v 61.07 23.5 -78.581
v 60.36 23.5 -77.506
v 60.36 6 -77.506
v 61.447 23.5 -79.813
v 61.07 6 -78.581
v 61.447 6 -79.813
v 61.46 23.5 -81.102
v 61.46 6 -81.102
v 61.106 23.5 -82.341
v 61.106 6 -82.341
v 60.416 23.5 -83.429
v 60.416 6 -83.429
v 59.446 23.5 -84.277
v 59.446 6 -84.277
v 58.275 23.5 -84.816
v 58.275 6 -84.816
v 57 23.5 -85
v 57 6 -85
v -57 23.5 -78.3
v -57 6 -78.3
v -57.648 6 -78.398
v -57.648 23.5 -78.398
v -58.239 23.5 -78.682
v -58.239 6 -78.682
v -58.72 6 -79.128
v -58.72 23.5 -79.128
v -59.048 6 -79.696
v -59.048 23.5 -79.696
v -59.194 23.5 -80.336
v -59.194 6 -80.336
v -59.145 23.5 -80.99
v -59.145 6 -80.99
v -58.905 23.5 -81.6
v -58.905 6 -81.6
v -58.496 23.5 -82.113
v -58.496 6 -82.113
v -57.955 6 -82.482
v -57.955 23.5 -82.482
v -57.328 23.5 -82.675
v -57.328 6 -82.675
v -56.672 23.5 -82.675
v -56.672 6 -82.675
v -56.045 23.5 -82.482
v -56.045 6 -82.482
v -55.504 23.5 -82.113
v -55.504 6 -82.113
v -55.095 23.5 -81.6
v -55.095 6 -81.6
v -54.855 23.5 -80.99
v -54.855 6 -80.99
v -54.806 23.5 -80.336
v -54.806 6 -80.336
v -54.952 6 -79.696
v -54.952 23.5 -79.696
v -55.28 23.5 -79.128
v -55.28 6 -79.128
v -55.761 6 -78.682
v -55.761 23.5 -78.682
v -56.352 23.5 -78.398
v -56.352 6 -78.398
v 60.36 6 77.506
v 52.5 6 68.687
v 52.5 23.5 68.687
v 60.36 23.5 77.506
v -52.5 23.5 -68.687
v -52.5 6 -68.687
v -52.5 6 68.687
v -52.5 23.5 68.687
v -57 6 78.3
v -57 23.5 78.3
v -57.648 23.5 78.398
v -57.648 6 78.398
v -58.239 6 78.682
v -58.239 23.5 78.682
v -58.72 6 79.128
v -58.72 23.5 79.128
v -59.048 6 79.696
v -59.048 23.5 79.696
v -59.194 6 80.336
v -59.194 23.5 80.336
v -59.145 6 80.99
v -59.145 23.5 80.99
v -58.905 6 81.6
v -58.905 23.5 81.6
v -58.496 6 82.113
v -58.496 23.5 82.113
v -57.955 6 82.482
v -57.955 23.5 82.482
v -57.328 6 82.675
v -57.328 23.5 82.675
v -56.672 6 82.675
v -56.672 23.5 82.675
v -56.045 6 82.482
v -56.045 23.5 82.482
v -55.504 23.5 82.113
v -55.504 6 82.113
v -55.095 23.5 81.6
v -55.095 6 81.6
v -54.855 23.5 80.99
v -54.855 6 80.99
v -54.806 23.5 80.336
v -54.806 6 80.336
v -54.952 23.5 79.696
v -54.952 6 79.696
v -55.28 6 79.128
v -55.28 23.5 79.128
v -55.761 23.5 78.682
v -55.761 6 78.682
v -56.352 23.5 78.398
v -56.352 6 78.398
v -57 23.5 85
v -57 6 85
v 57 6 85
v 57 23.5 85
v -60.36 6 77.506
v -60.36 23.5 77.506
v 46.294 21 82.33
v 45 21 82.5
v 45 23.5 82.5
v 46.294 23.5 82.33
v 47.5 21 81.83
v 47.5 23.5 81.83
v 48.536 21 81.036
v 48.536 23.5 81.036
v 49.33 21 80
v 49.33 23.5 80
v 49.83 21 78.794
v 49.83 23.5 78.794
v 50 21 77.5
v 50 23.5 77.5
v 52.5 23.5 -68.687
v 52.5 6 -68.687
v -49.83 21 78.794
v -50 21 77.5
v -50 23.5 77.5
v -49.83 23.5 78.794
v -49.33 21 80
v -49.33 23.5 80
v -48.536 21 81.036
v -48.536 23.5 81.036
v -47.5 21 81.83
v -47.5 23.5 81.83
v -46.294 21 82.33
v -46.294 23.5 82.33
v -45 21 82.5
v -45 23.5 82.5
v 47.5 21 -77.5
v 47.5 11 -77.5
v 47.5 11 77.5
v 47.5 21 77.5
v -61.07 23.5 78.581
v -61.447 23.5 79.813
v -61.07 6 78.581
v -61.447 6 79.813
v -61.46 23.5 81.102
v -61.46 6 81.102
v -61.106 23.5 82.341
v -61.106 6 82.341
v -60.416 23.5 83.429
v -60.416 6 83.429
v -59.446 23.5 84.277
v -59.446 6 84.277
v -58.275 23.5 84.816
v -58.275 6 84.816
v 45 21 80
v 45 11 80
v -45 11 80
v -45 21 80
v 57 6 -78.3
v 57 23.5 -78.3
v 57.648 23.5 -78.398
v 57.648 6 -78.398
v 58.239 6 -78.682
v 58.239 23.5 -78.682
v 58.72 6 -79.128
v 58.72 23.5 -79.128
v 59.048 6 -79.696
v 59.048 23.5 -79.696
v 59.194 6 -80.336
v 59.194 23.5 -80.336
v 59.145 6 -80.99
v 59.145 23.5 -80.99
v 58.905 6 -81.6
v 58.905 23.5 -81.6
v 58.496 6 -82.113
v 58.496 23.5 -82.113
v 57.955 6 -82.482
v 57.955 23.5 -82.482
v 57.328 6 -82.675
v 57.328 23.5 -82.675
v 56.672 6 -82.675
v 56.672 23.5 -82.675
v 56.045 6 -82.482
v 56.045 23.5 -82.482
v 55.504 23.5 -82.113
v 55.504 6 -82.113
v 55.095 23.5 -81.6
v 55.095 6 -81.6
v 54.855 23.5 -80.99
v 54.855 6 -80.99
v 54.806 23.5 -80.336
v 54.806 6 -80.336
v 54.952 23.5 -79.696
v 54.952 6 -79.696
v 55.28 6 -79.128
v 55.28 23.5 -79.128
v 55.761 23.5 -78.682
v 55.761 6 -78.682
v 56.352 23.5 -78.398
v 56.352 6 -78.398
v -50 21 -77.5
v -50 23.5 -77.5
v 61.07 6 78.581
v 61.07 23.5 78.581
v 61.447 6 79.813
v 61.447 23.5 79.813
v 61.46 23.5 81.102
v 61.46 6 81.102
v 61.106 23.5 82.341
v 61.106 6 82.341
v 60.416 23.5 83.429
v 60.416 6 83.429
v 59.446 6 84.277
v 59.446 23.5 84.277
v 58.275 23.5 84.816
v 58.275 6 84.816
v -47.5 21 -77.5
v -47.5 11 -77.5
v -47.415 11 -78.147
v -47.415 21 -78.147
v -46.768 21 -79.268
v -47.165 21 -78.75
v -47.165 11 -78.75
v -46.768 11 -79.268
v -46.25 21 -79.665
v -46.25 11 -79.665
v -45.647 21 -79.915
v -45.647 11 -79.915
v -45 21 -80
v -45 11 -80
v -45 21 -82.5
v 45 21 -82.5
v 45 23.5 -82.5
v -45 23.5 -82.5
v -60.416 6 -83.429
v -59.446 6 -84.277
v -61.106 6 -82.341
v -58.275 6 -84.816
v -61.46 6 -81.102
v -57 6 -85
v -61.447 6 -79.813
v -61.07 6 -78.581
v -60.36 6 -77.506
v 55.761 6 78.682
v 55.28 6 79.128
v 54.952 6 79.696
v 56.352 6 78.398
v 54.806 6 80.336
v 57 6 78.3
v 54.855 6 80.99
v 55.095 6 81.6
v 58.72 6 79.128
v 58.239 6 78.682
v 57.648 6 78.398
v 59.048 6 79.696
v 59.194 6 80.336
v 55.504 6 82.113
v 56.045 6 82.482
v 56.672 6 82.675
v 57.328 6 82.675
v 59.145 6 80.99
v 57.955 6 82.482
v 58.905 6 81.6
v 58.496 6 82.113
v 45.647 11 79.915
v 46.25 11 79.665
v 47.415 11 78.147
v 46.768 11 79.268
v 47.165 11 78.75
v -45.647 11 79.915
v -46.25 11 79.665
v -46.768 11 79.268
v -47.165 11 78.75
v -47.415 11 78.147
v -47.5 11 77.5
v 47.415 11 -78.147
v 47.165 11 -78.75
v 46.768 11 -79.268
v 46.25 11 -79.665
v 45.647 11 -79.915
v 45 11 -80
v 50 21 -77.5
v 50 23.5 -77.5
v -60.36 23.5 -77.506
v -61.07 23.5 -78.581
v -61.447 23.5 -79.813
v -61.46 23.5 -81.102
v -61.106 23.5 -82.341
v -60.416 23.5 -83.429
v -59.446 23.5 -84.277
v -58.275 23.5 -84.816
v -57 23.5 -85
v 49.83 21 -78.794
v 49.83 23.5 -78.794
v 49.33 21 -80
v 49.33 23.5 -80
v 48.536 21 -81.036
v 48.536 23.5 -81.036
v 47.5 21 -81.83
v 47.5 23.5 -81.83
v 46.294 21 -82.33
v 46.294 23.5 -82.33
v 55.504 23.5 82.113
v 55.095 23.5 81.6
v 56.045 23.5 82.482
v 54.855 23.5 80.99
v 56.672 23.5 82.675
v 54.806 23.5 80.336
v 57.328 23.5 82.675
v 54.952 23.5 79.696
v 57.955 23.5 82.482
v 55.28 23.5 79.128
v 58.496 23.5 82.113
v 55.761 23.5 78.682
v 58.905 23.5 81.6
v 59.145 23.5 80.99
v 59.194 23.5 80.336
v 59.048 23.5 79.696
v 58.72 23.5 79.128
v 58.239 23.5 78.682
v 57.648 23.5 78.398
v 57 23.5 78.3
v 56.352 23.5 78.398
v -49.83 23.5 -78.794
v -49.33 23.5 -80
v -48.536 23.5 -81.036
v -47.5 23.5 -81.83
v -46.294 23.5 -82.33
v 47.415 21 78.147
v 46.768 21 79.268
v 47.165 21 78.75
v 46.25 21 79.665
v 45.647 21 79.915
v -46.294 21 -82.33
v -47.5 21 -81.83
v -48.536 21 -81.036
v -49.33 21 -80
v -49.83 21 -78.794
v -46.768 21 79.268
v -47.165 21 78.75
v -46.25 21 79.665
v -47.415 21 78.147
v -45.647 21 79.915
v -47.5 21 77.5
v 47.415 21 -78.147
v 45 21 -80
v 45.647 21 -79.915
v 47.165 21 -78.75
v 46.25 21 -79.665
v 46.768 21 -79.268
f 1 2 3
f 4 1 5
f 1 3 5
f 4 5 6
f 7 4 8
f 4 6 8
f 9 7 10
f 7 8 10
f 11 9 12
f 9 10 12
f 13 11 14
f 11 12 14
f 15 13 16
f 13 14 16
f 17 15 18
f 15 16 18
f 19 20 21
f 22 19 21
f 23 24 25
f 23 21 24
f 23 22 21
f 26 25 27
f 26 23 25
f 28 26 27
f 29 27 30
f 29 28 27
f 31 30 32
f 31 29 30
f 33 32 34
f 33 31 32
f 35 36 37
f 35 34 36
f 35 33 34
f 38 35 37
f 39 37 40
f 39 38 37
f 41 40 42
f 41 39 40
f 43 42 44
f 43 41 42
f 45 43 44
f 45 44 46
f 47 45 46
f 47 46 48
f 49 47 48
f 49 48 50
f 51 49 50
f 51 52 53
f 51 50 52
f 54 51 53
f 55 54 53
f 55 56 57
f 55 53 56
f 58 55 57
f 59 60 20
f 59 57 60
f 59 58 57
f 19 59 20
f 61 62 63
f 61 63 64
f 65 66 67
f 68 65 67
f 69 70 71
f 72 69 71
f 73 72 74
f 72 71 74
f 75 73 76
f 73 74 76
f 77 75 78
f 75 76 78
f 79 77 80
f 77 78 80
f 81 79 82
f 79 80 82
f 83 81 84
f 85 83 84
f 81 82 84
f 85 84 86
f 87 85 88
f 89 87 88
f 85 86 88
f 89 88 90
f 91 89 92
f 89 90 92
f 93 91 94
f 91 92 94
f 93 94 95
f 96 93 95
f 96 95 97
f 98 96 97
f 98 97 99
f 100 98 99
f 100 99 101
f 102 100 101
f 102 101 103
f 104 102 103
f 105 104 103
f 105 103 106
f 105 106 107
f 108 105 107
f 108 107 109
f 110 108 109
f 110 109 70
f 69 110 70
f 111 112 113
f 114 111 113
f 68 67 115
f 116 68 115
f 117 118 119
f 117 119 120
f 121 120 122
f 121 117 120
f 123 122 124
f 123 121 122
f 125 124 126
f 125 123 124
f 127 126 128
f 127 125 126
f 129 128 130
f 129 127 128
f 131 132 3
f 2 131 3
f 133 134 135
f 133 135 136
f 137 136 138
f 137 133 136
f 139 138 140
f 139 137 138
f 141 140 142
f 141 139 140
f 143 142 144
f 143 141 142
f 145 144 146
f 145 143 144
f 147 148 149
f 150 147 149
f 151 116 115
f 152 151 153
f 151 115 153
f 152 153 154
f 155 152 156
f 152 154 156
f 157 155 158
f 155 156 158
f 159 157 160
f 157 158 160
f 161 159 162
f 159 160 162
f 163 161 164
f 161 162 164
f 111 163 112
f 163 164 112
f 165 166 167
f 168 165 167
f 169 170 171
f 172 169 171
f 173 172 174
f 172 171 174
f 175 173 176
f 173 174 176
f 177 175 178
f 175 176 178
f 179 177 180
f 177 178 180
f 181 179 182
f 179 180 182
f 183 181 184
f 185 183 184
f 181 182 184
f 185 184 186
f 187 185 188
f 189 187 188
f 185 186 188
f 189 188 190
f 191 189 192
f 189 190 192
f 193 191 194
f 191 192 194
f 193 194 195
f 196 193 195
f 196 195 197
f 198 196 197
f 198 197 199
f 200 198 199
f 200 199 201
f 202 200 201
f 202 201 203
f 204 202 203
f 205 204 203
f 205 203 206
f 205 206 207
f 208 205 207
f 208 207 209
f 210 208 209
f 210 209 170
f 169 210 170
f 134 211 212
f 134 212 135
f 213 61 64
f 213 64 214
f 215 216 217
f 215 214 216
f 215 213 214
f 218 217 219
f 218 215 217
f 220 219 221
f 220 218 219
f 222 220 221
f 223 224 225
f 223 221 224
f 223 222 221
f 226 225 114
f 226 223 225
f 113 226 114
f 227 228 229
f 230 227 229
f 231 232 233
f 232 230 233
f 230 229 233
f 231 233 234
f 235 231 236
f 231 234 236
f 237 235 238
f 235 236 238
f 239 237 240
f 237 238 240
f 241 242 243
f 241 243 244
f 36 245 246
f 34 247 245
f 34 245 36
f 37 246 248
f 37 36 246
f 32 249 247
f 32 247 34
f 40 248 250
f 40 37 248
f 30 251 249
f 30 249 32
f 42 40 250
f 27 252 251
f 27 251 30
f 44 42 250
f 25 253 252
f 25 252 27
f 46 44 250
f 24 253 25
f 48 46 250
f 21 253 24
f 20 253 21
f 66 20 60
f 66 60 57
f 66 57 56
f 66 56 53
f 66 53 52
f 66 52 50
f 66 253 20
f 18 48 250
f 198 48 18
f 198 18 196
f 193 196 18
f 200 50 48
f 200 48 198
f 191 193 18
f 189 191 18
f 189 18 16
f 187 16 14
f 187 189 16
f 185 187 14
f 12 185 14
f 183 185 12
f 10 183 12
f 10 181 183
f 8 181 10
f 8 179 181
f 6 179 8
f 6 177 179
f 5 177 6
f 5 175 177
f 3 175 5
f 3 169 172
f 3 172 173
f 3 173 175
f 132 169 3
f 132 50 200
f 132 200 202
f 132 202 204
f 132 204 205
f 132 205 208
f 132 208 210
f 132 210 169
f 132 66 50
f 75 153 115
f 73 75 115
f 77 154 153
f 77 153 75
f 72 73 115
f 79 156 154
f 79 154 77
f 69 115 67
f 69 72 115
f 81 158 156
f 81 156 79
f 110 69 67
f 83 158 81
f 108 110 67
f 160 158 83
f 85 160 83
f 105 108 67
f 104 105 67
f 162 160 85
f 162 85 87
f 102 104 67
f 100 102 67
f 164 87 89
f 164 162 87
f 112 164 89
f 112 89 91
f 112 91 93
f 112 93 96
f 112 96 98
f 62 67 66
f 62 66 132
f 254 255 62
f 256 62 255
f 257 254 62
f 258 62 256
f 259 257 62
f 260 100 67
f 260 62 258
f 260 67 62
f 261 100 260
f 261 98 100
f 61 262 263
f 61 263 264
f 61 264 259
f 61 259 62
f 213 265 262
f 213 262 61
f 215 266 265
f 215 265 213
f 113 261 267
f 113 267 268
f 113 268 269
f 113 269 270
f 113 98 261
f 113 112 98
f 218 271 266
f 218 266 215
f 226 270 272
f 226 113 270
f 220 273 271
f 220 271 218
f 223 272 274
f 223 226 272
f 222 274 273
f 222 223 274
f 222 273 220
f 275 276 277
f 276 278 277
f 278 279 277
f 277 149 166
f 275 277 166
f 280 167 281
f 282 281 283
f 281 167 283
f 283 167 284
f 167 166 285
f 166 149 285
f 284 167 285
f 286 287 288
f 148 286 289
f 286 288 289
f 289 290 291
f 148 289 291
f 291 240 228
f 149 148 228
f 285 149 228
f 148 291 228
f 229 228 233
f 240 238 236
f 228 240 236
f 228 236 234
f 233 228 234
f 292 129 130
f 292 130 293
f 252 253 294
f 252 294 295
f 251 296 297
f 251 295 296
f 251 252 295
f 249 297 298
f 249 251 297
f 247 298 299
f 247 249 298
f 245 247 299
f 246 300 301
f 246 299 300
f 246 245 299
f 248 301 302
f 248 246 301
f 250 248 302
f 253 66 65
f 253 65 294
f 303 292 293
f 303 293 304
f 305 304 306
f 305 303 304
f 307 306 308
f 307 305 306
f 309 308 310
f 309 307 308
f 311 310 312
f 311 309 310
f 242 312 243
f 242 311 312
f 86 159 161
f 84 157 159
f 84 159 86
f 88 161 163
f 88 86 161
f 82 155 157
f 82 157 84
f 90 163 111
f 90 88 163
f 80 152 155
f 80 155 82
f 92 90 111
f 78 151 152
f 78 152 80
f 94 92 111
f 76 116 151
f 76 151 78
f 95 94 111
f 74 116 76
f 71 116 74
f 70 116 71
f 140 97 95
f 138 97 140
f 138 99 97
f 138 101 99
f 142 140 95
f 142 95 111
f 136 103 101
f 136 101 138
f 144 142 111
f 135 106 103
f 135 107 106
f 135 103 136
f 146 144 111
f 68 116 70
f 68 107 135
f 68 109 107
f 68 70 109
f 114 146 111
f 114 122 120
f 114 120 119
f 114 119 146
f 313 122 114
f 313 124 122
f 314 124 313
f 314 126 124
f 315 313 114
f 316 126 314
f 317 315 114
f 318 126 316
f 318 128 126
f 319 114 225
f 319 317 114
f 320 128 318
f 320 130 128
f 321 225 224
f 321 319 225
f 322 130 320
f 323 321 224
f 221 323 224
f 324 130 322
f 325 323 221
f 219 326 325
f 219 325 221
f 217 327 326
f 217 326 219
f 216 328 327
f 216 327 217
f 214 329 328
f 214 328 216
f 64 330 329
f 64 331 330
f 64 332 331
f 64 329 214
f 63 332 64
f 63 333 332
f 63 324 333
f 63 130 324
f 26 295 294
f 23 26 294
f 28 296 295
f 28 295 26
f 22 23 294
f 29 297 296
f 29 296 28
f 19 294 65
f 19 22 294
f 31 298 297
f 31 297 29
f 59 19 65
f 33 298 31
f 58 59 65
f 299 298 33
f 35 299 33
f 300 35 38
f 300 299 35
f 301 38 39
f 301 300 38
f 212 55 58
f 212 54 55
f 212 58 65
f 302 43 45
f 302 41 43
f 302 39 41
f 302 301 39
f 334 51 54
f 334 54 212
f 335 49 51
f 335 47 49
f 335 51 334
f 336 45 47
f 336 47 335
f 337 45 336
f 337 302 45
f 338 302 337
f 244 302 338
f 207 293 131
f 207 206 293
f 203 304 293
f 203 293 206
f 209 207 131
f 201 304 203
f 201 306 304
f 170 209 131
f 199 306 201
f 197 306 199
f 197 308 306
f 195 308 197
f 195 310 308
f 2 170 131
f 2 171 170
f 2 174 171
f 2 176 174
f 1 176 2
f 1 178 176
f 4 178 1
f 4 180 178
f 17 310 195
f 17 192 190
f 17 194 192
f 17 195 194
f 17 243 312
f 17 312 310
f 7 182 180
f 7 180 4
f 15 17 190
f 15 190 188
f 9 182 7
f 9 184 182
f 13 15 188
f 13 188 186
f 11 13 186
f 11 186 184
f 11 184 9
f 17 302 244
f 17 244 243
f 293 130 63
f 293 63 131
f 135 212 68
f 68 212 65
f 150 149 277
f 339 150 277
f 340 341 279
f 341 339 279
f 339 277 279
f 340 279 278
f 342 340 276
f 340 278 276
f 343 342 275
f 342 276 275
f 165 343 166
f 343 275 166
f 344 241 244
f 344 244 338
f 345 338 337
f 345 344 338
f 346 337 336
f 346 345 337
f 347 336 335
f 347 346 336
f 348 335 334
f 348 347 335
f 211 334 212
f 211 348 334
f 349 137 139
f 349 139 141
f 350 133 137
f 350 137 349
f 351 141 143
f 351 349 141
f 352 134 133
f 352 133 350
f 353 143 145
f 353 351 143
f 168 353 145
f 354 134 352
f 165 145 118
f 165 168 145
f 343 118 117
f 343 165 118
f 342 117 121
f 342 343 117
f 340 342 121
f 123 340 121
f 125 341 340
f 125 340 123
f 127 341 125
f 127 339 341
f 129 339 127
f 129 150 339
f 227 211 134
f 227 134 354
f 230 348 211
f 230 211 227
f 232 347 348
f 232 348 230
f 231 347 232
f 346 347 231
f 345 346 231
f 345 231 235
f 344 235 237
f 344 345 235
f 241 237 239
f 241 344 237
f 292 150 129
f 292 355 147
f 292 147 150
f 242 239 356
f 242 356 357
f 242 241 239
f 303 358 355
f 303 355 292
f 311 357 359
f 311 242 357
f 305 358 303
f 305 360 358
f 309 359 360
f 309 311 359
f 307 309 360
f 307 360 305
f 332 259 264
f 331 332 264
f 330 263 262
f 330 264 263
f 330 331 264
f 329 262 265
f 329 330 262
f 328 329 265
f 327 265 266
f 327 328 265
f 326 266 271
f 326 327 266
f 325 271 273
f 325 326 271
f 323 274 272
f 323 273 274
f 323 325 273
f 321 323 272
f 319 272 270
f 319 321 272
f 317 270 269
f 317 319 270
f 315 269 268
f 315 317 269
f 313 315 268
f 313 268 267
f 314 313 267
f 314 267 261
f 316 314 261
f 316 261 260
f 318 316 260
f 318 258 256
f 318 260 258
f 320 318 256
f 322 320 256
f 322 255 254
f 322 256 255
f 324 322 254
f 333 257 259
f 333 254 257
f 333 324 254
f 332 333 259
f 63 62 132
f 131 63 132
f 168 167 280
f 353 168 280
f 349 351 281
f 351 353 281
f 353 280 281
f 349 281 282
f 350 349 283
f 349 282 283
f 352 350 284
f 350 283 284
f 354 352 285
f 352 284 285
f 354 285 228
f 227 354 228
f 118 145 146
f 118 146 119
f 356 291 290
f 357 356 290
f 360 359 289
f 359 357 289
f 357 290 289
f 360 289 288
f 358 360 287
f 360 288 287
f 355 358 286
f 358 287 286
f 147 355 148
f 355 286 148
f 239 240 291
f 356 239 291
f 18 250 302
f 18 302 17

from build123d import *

# Parameters (mm, degrees)
SALIENTE_EXTRUIR2_DEPTH   = 11
SALIENTE_EXTRUIR3_DEPTH   = 25.5
SALIENTE_EXTRUIR4_DEPTH   = 2.5
SALIENTE_EXTRUIR5_DEPTH   = 36.5
SIMETR_A2_COPY_1_DEPTH    = 36.5
CROQUIS6_R                = 2.2
CORTAR_EXTRUIR2_DEPTH     = 112.083302076
SIMETR_A4_COPY_1_SKETCH_R = 2.2
SIMETR_A4_COPY_1_DEPTH    = 112.083302076
CORTAR_EXTRUIR3_DEPTH     = 6
CORTAR_EXTRUIR4_START     = -18
CORTAR_EXTRUIR4_DEPTH     = 18
CORTAR_EXTRUIR5_START     = -13
CORTAR_EXTRUIR5_DEPTH     = 13


with BuildPart() as part:
    # Croquis1 → Saliente-Extruir2 (new body)
    # profile 1 of 3: a face of its own
    with BuildSketch(Plane(origin=(0, 0, 0), x_dir=(1, 0, 0), z_dir=(0, 1, 0))):
        with BuildLine():
            Line((-45, 85), (45, 85))
            ThreePointArc((45, 85), (50.303300859, 82.803300859), (52.5, 77.5))
            Line((52.5, 77.5), (52.5, -77.5))
            ThreePointArc((52.5, -77.5), (50.303300859, -82.803300859), (45, -85))
            Line((45, -85), (-45, -85))
            ThreePointArc((-45, -85), (-50.303300859, -82.803300859), (-52.5, -77.5))
            Line((-52.5, -77.5), (-52.5, 77.5))
            ThreePointArc((-52.5, 77.5), (-50.303300859, 82.803300859), (-45, 85))
        make_face()
        with BuildLine():
            ThreePointArc((-45, 82.5), (-48.535533906, 81.035533906), (-50, 77.5))
            Line((-50, 77.5), (-50, -77.5))
            ThreePointArc((-50, -77.5), (-48.535533906, -81.035533906), (-45, -82.5))
            Line((-45, -82.5), (45, -82.5))
            ThreePointArc((45, -82.5), (48.535533906, -81.035533906), (50, -77.5))
            Line((50, -77.5), (50, 77.5))
            ThreePointArc((50, 77.5), (48.535533906, 81.035533906), (45, 82.5))
            Line((45, 82.5), (-45, 82.5))
        make_face(mode=Mode.SUBTRACT)
    # profile 2 of 3: a face of its own
    with BuildSketch(Plane(origin=(0, 0, 0), x_dir=(1, 0, 0), z_dir=(0, 1, 0))):
        with BuildLine():
            Line((-45, 82.5), (45, 82.5))
            ThreePointArc((45, 82.5), (48.535533906, 81.035533906), (50, 77.5))
            Line((50, 77.5), (50, -77.5))
            ThreePointArc((50, -77.5), (48.535533906, -81.035533906), (45, -82.5))
            Line((45, -82.5), (-45, -82.5))
            ThreePointArc((-45, -82.5), (-48.535533906, -81.035533906), (-50, -77.5))
            Line((-50, -77.5), (-50, 77.5))
            ThreePointArc((-50, 77.5), (-48.535533906, 81.035533906), (-45, 82.5))
        make_face()
        with BuildLine():
            ThreePointArc((45, -80), (46.767766953, -79.267766953), (47.5, -77.5))
            Line((47.5, -77.5), (47.5, 77.5))
            ThreePointArc((47.5, 77.5), (46.767766953, 79.267766953), (45, 80))
            Line((45, 80), (-45, 80))
            ThreePointArc((-45, 80), (-46.767766953, 79.267766953), (-47.5, 77.5))
            Line((-47.5, 77.5), (-47.5, -77.5))
            ThreePointArc((-47.5, -77.5), (-46.767766953, -79.267766953), (-45, -80))
            Line((-45, -80), (45, -80))
        make_face(mode=Mode.SUBTRACT)
    # profile 3 of 3: a face of its own
    with BuildSketch(Plane(origin=(0, 0, 0), x_dir=(1, 0, 0), z_dir=(0, 1, 0))):
        with BuildLine():
            Line((-45, -80), (45, -80))
            ThreePointArc((45, -80), (46.767766953, -79.267766953), (47.5, -77.5))
            Line((47.5, -77.5), (47.5, 77.5))
            ThreePointArc((47.5, 77.5), (46.767766953, 79.267766953), (45, 80))
            Line((45, 80), (-45, 80))
            ThreePointArc((-45, 80), (-46.767766953, 79.267766953), (-47.5, 77.5))
            Line((-47.5, 77.5), (-47.5, -77.5))
            ThreePointArc((-47.5, -77.5), (-46.767766953, -79.267766953), (-45, -80))
        make_face()
    extrude(amount=SALIENTE_EXTRUIR2_DEPTH)

    # Croquis2 → Saliente-Extruir3 (add)
    # profile 1 of 2: a face of its own
    with BuildSketch(Plane(origin=(0, 11, 0), x_dir=(1, 0, 0), z_dir=(0, 1, 0))):
        with BuildLine():
            ThreePointArc((52.5, 77.5), (50.303300859, 82.803300859), (45, 85))
            Line((45, 85), (-45, 85))
            ThreePointArc((-45, 85), (-50.303300859, 82.803300859), (-52.5, 77.5))
            Line((-52.5, 77.5), (-52.5, -77.5))
            ThreePointArc((-52.5, -77.5), (-50.303300859, -82.803300859), (-45, -85))
            Line((-45, -85), (45, -85))
            ThreePointArc((45, -85), (50.303300859, -82.803300859), (52.5, -77.5))
            Line((52.5, -77.5), (52.5, 77.5))
        make_face()
        with BuildLine():
            ThreePointArc((-45, 82.5), (-48.535533906, 81.035533906), (-50, 77.5))
            Line((-50, 77.5), (-50, -77.5))
            ThreePointArc((-50, -77.5), (-48.535533906, -81.035533906), (-45, -82.5))
            Line((-45, -82.5), (45, -82.5))
            ThreePointArc((45, -82.5), (48.535533906, -81.035533906), (50, -77.5))
            Line((50, -77.5), (50, 77.5))
            ThreePointArc((50, 77.5), (48.535533906, 81.035533906), (45, 82.5))
            Line((45, 82.5), (-45, 82.5))
        make_face(mode=Mode.SUBTRACT)
    # profile 2 of 2: a face of its own
    with BuildSketch(Plane(origin=(0, 11, 0), x_dir=(1, 0, 0), z_dir=(0, 1, 0))):
        with BuildLine():
            Line((45, 82.5), (-45, 82.5))
            ThreePointArc((-45, 82.5), (-48.535533906, 81.035533906), (-50, 77.5))
            Line((-50, 77.5), (-50, -77.5))
            ThreePointArc((-50, -77.5), (-48.535533906, -81.035533906), (-45, -82.5))
            Line((-45, -82.5), (45, -82.5))
            ThreePointArc((45, -82.5), (48.535533906, -81.035533906), (50, -77.5))
            Line((50, -77.5), (50, 77.5))
            ThreePointArc((50, 77.5), (48.535533906, 81.035533906), (45, 82.5))
        make_face()
        with BuildLine():
            ThreePointArc((-45, 80), (-46.767766953, 79.267766953), (-47.5, 77.5))
            Line((-47.5, 77.5), (-47.5, -77.5))
            ThreePointArc((-47.5, -77.5), (-46.767766953, -79.267766953), (-45, -80))
            Line((-45, -80), (45, -80))
            ThreePointArc((45, -80), (46.767766953, -79.267766953), (47.5, -77.5))
            Line((47.5, -77.5), (47.5, 77.5))
            ThreePointArc((47.5, 77.5), (46.767766953, 79.267766953), (45, 80))
            Line((45, 80), (-45, 80))
        make_face(mode=Mode.SUBTRACT)
    extrude(amount=SALIENTE_EXTRUIR3_DEPTH)

    # Croquis3 → Saliente-Extruir4 (add)
    with BuildSketch(Plane(origin=(0, 36.5, 0), x_dir=(1, 0, 0), z_dir=(0, 1, 0))):
        with BuildLine():
            Line((45, 82.5), (-45, 82.5))
            ThreePointArc((-45, 82.5), (-48.535533906, 81.035533906), (-50, 77.5))
            Line((-50, 77.5), (-50, -77.5))
            ThreePointArc((-50, -77.5), (-48.535533906, -81.035533906), (-45, -82.5))
            Line((-45, -82.5), (45, -82.5))
            ThreePointArc((45, -82.5), (48.535533906, -81.035533906), (50, -77.5))
            Line((50, -77.5), (50, 77.5))
            ThreePointArc((50, 77.5), (48.535533906, 81.035533906), (45, 82.5))
        make_face()
        with BuildLine():
            Line((-47.5, -77.5), (-47.5, 77.5))
            ThreePointArc((-47.5, 77.5), (-46.767766953, 79.267766953), (-45, 80))
            Line((-45, 80), (45, 80))
            ThreePointArc((45, 80), (46.767766953, 79.267766953), (47.5, 77.5))
            Line((47.5, 77.5), (47.5, -77.5))
            ThreePointArc((47.5, -77.5), (46.767766953, -79.267766953), (45, -80))
            Line((45, -80), (-45, -80))
            ThreePointArc((-45, -80), (-46.767766953, -79.267766953), (-47.5, -77.5))
        make_face(mode=Mode.SUBTRACT)
    extrude(amount=SALIENTE_EXTRUIR4_DEPTH)

    # Croquis4 → Saliente-Extruir5 (add)
    with BuildSketch(Plane.XZ):
        with BuildLine():
            Line((57, 85), (45, 85))
            ThreePointArc((45, 85), (50.303300859, 82.803300859), (52.5, 77.5))
            Line((52.5, 77.5), (52.5, 68.686877301))
            Line((52.5, 68.686877301), (60.359510947, 77.506058418))
            ThreePointArc((60.359510947, 77.506058418), (61.10625968, 82.340823577), (57, 85))
        make_face()
    saliente_extruir5 = extrude(amount=-SALIENTE_EXTRUIR5_DEPTH)

    # Simetría1: Saliente-Extruir5 across plane
    add(saliente_extruir5.mirror(Plane(origin=(0, 0, 0), x_dir=(0, 0, 1), z_dir=(1, 0, 0))))

    # Simetría2: Saliente-Extruir5 across plane
    add(saliente_extruir5.mirror(Plane.XY))

    # Simetría2 copy 1 sketch → Simetría2 copy 1 (add)
    with BuildSketch(Plane(origin=(0, 0, 0), x_dir=(-1, 0, 0), z_dir=(0, -1, 0))):
        with BuildLine():
            Line((57, 85), (45, 85))
            ThreePointArc((45, 85), (50.303300859, 82.803300859), (52.5, 77.5))
            Line((52.5, 77.5), (52.5, 68.686877301))
            Line((52.5, 68.686877301), (60.359510947, 77.506058418))
            ThreePointArc((60.359510947, 77.506058418), (61.10625968, 82.340823577), (57, 85))
        make_face()
    extrude(amount=-SIMETR_A2_COPY_1_DEPTH)

    # Croquis6 → Cortar-Extruir2 (cut, through all)
    with BuildSketch(Plane(origin=(0, 36.5, 0), x_dir=(1, 0, 0), z_dir=(0, 1, 0))):
        with Locations(Location((57, 80.5, 0), (0, 0, 270))):
            Circle(CROQUIS6_R)
    cortar_extruir2 = extrude(amount=-CORTAR_EXTRUIR2_DEPTH, mode=Mode.SUBTRACT)

    # Simetría3: Cortar-Extruir2 across plane
    add(cortar_extruir2.mirror(Plane(origin=(0, 0, 0), x_dir=(0, 0, 1), z_dir=(1, 0, 0))), mode=Mode.SUBTRACT)

    # Simetría4: Cortar-Extruir2 across plane
    add(cortar_extruir2.mirror(Plane.XY), mode=Mode.SUBTRACT)

    # Simetría4 copy 1 sketch → Simetría4 copy 1 (cut, through all)
    with BuildSketch(Plane(origin=(0, 36.5, 0), x_dir=(-1, 0, 0), z_dir=(0, 1, 0))):
        with Locations(Location((57, 80.5, 0), (0, 0, 270))):
            Circle(SIMETR_A4_COPY_1_SKETCH_R)
    extrude(amount=-SIMETR_A4_COPY_1_DEPTH, mode=Mode.SUBTRACT)

    # Croquis8 → Cortar-Extruir3 (cut)
    with BuildSketch(Plane.XZ):
        with BuildLine():
            Line((-57, -85), (57, -85))
            ThreePointArc((57, -85), (61.10625968, -82.340823577), (60.359510947, -77.506058418))
            Line((60.359510947, -77.506058418), (52.5, -68.686877301))
            Line((52.5, -68.686877301), (52.5, 68.686877301))
            Line((52.5, 68.686877301), (60.359510947, 77.506058418))
            ThreePointArc((60.359510947, 77.506058418), (61.10625968, 82.340823577), (57, 85))
            Line((57, 85), (-57, 85))
            ThreePointArc((-57, 85), (-61.10625968, 82.340823577), (-60.359510947, 77.506058418))
            Line((-60.359510947, 77.506058418), (-52.5, 68.686877301))
            Line((-52.5, 68.686877301), (-52.5, -68.686877301))
            Line((-52.5, -68.686877301), (-60.359510947, -77.506058418))
            ThreePointArc((-60.359510947, -77.506058418), (-61.10625968, -82.340823577), (-57, -85))
        make_face()
    extrude(amount=-CORTAR_EXTRUIR3_DEPTH, mode=Mode.SUBTRACT)

    # Croquis9 → Cortar-Extruir4 (cut)
    with BuildSketch(Plane(origin=(0, 39, 0), x_dir=(1, 0, 0), z_dir=(0, 1, 0)).offset(CORTAR_EXTRUIR4_START)):
        with BuildLine():
            Line((45, 82.5), (-45, 82.5))
            ThreePointArc((-45, 82.5), (-48.535533906, 81.035533906), (-50, 77.5))
            Line((-50, 77.5), (-50, -77.5))
            ThreePointArc((-50, -77.5), (-48.535533906, -81.035533906), (-45, -82.5))
            Line((-45, -82.5), (45, -82.5))
            ThreePointArc((45, -82.5), (48.535533906, -81.035533906), (50, -77.5))
            Line((50, -77.5), (50, 77.5))
            ThreePointArc((50, 77.5), (48.535533906, 81.035533906), (45, 82.5))
        make_face()
        with BuildLine():
            Line((-47.5, 77.5), (-47.5, -77.5))
            ThreePointArc((-47.5, -77.5), (-46.767766953, -79.267766953), (-45, -80))
            Line((-45, -80), (45, -80))
            ThreePointArc((45, -80), (46.767766953, -79.267766953), (47.5, -77.5))
            Line((47.5, -77.5), (47.5, 77.5))
            ThreePointArc((47.5, 77.5), (46.767766953, 79.267766953), (45, 80))
            Line((45, 80), (-45, 80))
            ThreePointArc((-45, 80), (-46.767766953, 79.267766953), (-47.5, 77.5))
        make_face(mode=Mode.SUBTRACT)
    extrude(amount=CORTAR_EXTRUIR4_DEPTH, mode=Mode.SUBTRACT)

    # Croquis10 → Cortar-Extruir5 (cut)
    with BuildSketch(Plane(origin=(0, 36.5, 0), x_dir=(1, 0, 0), z_dir=(0, 1, 0)).offset(CORTAR_EXTRUIR5_START)):
        with BuildLine():
            Line((57, 85), (-57, 85))
            ThreePointArc((-57, 85), (-61.10625968, 82.340823577), (-60.359510947, 77.506058418))
            Line((-60.359510947, 77.506058418), (-52.5, 68.686877301))
            Line((-52.5, 68.686877301), (-52.5, -68.686877301))
            Line((-52.5, -68.686877301), (-60.359510947, -77.506058418))
            ThreePointArc((-60.359510947, -77.506058418), (-61.10625968, -82.340823577), (-57, -85))
            Line((-57, -85), (57, -85))
            ThreePointArc((57, -85), (61.10625968, -82.340823577), (60.359510947, -77.506058418))
            Line((60.359510947, -77.506058418), (52.5, -68.686877301))
            Line((52.5, -68.686877301), (52.5, 68.686877301))
            Line((52.5, 68.686877301), (60.359510947, 77.506058418))
            ThreePointArc((60.359510947, 77.506058418), (61.10625968, 82.340823577), (57, 85))
        make_face()
    extrude(amount=CORTAR_EXTRUIR5_DEPTH, mode=Mode.SUBTRACT)


solid = part.part
